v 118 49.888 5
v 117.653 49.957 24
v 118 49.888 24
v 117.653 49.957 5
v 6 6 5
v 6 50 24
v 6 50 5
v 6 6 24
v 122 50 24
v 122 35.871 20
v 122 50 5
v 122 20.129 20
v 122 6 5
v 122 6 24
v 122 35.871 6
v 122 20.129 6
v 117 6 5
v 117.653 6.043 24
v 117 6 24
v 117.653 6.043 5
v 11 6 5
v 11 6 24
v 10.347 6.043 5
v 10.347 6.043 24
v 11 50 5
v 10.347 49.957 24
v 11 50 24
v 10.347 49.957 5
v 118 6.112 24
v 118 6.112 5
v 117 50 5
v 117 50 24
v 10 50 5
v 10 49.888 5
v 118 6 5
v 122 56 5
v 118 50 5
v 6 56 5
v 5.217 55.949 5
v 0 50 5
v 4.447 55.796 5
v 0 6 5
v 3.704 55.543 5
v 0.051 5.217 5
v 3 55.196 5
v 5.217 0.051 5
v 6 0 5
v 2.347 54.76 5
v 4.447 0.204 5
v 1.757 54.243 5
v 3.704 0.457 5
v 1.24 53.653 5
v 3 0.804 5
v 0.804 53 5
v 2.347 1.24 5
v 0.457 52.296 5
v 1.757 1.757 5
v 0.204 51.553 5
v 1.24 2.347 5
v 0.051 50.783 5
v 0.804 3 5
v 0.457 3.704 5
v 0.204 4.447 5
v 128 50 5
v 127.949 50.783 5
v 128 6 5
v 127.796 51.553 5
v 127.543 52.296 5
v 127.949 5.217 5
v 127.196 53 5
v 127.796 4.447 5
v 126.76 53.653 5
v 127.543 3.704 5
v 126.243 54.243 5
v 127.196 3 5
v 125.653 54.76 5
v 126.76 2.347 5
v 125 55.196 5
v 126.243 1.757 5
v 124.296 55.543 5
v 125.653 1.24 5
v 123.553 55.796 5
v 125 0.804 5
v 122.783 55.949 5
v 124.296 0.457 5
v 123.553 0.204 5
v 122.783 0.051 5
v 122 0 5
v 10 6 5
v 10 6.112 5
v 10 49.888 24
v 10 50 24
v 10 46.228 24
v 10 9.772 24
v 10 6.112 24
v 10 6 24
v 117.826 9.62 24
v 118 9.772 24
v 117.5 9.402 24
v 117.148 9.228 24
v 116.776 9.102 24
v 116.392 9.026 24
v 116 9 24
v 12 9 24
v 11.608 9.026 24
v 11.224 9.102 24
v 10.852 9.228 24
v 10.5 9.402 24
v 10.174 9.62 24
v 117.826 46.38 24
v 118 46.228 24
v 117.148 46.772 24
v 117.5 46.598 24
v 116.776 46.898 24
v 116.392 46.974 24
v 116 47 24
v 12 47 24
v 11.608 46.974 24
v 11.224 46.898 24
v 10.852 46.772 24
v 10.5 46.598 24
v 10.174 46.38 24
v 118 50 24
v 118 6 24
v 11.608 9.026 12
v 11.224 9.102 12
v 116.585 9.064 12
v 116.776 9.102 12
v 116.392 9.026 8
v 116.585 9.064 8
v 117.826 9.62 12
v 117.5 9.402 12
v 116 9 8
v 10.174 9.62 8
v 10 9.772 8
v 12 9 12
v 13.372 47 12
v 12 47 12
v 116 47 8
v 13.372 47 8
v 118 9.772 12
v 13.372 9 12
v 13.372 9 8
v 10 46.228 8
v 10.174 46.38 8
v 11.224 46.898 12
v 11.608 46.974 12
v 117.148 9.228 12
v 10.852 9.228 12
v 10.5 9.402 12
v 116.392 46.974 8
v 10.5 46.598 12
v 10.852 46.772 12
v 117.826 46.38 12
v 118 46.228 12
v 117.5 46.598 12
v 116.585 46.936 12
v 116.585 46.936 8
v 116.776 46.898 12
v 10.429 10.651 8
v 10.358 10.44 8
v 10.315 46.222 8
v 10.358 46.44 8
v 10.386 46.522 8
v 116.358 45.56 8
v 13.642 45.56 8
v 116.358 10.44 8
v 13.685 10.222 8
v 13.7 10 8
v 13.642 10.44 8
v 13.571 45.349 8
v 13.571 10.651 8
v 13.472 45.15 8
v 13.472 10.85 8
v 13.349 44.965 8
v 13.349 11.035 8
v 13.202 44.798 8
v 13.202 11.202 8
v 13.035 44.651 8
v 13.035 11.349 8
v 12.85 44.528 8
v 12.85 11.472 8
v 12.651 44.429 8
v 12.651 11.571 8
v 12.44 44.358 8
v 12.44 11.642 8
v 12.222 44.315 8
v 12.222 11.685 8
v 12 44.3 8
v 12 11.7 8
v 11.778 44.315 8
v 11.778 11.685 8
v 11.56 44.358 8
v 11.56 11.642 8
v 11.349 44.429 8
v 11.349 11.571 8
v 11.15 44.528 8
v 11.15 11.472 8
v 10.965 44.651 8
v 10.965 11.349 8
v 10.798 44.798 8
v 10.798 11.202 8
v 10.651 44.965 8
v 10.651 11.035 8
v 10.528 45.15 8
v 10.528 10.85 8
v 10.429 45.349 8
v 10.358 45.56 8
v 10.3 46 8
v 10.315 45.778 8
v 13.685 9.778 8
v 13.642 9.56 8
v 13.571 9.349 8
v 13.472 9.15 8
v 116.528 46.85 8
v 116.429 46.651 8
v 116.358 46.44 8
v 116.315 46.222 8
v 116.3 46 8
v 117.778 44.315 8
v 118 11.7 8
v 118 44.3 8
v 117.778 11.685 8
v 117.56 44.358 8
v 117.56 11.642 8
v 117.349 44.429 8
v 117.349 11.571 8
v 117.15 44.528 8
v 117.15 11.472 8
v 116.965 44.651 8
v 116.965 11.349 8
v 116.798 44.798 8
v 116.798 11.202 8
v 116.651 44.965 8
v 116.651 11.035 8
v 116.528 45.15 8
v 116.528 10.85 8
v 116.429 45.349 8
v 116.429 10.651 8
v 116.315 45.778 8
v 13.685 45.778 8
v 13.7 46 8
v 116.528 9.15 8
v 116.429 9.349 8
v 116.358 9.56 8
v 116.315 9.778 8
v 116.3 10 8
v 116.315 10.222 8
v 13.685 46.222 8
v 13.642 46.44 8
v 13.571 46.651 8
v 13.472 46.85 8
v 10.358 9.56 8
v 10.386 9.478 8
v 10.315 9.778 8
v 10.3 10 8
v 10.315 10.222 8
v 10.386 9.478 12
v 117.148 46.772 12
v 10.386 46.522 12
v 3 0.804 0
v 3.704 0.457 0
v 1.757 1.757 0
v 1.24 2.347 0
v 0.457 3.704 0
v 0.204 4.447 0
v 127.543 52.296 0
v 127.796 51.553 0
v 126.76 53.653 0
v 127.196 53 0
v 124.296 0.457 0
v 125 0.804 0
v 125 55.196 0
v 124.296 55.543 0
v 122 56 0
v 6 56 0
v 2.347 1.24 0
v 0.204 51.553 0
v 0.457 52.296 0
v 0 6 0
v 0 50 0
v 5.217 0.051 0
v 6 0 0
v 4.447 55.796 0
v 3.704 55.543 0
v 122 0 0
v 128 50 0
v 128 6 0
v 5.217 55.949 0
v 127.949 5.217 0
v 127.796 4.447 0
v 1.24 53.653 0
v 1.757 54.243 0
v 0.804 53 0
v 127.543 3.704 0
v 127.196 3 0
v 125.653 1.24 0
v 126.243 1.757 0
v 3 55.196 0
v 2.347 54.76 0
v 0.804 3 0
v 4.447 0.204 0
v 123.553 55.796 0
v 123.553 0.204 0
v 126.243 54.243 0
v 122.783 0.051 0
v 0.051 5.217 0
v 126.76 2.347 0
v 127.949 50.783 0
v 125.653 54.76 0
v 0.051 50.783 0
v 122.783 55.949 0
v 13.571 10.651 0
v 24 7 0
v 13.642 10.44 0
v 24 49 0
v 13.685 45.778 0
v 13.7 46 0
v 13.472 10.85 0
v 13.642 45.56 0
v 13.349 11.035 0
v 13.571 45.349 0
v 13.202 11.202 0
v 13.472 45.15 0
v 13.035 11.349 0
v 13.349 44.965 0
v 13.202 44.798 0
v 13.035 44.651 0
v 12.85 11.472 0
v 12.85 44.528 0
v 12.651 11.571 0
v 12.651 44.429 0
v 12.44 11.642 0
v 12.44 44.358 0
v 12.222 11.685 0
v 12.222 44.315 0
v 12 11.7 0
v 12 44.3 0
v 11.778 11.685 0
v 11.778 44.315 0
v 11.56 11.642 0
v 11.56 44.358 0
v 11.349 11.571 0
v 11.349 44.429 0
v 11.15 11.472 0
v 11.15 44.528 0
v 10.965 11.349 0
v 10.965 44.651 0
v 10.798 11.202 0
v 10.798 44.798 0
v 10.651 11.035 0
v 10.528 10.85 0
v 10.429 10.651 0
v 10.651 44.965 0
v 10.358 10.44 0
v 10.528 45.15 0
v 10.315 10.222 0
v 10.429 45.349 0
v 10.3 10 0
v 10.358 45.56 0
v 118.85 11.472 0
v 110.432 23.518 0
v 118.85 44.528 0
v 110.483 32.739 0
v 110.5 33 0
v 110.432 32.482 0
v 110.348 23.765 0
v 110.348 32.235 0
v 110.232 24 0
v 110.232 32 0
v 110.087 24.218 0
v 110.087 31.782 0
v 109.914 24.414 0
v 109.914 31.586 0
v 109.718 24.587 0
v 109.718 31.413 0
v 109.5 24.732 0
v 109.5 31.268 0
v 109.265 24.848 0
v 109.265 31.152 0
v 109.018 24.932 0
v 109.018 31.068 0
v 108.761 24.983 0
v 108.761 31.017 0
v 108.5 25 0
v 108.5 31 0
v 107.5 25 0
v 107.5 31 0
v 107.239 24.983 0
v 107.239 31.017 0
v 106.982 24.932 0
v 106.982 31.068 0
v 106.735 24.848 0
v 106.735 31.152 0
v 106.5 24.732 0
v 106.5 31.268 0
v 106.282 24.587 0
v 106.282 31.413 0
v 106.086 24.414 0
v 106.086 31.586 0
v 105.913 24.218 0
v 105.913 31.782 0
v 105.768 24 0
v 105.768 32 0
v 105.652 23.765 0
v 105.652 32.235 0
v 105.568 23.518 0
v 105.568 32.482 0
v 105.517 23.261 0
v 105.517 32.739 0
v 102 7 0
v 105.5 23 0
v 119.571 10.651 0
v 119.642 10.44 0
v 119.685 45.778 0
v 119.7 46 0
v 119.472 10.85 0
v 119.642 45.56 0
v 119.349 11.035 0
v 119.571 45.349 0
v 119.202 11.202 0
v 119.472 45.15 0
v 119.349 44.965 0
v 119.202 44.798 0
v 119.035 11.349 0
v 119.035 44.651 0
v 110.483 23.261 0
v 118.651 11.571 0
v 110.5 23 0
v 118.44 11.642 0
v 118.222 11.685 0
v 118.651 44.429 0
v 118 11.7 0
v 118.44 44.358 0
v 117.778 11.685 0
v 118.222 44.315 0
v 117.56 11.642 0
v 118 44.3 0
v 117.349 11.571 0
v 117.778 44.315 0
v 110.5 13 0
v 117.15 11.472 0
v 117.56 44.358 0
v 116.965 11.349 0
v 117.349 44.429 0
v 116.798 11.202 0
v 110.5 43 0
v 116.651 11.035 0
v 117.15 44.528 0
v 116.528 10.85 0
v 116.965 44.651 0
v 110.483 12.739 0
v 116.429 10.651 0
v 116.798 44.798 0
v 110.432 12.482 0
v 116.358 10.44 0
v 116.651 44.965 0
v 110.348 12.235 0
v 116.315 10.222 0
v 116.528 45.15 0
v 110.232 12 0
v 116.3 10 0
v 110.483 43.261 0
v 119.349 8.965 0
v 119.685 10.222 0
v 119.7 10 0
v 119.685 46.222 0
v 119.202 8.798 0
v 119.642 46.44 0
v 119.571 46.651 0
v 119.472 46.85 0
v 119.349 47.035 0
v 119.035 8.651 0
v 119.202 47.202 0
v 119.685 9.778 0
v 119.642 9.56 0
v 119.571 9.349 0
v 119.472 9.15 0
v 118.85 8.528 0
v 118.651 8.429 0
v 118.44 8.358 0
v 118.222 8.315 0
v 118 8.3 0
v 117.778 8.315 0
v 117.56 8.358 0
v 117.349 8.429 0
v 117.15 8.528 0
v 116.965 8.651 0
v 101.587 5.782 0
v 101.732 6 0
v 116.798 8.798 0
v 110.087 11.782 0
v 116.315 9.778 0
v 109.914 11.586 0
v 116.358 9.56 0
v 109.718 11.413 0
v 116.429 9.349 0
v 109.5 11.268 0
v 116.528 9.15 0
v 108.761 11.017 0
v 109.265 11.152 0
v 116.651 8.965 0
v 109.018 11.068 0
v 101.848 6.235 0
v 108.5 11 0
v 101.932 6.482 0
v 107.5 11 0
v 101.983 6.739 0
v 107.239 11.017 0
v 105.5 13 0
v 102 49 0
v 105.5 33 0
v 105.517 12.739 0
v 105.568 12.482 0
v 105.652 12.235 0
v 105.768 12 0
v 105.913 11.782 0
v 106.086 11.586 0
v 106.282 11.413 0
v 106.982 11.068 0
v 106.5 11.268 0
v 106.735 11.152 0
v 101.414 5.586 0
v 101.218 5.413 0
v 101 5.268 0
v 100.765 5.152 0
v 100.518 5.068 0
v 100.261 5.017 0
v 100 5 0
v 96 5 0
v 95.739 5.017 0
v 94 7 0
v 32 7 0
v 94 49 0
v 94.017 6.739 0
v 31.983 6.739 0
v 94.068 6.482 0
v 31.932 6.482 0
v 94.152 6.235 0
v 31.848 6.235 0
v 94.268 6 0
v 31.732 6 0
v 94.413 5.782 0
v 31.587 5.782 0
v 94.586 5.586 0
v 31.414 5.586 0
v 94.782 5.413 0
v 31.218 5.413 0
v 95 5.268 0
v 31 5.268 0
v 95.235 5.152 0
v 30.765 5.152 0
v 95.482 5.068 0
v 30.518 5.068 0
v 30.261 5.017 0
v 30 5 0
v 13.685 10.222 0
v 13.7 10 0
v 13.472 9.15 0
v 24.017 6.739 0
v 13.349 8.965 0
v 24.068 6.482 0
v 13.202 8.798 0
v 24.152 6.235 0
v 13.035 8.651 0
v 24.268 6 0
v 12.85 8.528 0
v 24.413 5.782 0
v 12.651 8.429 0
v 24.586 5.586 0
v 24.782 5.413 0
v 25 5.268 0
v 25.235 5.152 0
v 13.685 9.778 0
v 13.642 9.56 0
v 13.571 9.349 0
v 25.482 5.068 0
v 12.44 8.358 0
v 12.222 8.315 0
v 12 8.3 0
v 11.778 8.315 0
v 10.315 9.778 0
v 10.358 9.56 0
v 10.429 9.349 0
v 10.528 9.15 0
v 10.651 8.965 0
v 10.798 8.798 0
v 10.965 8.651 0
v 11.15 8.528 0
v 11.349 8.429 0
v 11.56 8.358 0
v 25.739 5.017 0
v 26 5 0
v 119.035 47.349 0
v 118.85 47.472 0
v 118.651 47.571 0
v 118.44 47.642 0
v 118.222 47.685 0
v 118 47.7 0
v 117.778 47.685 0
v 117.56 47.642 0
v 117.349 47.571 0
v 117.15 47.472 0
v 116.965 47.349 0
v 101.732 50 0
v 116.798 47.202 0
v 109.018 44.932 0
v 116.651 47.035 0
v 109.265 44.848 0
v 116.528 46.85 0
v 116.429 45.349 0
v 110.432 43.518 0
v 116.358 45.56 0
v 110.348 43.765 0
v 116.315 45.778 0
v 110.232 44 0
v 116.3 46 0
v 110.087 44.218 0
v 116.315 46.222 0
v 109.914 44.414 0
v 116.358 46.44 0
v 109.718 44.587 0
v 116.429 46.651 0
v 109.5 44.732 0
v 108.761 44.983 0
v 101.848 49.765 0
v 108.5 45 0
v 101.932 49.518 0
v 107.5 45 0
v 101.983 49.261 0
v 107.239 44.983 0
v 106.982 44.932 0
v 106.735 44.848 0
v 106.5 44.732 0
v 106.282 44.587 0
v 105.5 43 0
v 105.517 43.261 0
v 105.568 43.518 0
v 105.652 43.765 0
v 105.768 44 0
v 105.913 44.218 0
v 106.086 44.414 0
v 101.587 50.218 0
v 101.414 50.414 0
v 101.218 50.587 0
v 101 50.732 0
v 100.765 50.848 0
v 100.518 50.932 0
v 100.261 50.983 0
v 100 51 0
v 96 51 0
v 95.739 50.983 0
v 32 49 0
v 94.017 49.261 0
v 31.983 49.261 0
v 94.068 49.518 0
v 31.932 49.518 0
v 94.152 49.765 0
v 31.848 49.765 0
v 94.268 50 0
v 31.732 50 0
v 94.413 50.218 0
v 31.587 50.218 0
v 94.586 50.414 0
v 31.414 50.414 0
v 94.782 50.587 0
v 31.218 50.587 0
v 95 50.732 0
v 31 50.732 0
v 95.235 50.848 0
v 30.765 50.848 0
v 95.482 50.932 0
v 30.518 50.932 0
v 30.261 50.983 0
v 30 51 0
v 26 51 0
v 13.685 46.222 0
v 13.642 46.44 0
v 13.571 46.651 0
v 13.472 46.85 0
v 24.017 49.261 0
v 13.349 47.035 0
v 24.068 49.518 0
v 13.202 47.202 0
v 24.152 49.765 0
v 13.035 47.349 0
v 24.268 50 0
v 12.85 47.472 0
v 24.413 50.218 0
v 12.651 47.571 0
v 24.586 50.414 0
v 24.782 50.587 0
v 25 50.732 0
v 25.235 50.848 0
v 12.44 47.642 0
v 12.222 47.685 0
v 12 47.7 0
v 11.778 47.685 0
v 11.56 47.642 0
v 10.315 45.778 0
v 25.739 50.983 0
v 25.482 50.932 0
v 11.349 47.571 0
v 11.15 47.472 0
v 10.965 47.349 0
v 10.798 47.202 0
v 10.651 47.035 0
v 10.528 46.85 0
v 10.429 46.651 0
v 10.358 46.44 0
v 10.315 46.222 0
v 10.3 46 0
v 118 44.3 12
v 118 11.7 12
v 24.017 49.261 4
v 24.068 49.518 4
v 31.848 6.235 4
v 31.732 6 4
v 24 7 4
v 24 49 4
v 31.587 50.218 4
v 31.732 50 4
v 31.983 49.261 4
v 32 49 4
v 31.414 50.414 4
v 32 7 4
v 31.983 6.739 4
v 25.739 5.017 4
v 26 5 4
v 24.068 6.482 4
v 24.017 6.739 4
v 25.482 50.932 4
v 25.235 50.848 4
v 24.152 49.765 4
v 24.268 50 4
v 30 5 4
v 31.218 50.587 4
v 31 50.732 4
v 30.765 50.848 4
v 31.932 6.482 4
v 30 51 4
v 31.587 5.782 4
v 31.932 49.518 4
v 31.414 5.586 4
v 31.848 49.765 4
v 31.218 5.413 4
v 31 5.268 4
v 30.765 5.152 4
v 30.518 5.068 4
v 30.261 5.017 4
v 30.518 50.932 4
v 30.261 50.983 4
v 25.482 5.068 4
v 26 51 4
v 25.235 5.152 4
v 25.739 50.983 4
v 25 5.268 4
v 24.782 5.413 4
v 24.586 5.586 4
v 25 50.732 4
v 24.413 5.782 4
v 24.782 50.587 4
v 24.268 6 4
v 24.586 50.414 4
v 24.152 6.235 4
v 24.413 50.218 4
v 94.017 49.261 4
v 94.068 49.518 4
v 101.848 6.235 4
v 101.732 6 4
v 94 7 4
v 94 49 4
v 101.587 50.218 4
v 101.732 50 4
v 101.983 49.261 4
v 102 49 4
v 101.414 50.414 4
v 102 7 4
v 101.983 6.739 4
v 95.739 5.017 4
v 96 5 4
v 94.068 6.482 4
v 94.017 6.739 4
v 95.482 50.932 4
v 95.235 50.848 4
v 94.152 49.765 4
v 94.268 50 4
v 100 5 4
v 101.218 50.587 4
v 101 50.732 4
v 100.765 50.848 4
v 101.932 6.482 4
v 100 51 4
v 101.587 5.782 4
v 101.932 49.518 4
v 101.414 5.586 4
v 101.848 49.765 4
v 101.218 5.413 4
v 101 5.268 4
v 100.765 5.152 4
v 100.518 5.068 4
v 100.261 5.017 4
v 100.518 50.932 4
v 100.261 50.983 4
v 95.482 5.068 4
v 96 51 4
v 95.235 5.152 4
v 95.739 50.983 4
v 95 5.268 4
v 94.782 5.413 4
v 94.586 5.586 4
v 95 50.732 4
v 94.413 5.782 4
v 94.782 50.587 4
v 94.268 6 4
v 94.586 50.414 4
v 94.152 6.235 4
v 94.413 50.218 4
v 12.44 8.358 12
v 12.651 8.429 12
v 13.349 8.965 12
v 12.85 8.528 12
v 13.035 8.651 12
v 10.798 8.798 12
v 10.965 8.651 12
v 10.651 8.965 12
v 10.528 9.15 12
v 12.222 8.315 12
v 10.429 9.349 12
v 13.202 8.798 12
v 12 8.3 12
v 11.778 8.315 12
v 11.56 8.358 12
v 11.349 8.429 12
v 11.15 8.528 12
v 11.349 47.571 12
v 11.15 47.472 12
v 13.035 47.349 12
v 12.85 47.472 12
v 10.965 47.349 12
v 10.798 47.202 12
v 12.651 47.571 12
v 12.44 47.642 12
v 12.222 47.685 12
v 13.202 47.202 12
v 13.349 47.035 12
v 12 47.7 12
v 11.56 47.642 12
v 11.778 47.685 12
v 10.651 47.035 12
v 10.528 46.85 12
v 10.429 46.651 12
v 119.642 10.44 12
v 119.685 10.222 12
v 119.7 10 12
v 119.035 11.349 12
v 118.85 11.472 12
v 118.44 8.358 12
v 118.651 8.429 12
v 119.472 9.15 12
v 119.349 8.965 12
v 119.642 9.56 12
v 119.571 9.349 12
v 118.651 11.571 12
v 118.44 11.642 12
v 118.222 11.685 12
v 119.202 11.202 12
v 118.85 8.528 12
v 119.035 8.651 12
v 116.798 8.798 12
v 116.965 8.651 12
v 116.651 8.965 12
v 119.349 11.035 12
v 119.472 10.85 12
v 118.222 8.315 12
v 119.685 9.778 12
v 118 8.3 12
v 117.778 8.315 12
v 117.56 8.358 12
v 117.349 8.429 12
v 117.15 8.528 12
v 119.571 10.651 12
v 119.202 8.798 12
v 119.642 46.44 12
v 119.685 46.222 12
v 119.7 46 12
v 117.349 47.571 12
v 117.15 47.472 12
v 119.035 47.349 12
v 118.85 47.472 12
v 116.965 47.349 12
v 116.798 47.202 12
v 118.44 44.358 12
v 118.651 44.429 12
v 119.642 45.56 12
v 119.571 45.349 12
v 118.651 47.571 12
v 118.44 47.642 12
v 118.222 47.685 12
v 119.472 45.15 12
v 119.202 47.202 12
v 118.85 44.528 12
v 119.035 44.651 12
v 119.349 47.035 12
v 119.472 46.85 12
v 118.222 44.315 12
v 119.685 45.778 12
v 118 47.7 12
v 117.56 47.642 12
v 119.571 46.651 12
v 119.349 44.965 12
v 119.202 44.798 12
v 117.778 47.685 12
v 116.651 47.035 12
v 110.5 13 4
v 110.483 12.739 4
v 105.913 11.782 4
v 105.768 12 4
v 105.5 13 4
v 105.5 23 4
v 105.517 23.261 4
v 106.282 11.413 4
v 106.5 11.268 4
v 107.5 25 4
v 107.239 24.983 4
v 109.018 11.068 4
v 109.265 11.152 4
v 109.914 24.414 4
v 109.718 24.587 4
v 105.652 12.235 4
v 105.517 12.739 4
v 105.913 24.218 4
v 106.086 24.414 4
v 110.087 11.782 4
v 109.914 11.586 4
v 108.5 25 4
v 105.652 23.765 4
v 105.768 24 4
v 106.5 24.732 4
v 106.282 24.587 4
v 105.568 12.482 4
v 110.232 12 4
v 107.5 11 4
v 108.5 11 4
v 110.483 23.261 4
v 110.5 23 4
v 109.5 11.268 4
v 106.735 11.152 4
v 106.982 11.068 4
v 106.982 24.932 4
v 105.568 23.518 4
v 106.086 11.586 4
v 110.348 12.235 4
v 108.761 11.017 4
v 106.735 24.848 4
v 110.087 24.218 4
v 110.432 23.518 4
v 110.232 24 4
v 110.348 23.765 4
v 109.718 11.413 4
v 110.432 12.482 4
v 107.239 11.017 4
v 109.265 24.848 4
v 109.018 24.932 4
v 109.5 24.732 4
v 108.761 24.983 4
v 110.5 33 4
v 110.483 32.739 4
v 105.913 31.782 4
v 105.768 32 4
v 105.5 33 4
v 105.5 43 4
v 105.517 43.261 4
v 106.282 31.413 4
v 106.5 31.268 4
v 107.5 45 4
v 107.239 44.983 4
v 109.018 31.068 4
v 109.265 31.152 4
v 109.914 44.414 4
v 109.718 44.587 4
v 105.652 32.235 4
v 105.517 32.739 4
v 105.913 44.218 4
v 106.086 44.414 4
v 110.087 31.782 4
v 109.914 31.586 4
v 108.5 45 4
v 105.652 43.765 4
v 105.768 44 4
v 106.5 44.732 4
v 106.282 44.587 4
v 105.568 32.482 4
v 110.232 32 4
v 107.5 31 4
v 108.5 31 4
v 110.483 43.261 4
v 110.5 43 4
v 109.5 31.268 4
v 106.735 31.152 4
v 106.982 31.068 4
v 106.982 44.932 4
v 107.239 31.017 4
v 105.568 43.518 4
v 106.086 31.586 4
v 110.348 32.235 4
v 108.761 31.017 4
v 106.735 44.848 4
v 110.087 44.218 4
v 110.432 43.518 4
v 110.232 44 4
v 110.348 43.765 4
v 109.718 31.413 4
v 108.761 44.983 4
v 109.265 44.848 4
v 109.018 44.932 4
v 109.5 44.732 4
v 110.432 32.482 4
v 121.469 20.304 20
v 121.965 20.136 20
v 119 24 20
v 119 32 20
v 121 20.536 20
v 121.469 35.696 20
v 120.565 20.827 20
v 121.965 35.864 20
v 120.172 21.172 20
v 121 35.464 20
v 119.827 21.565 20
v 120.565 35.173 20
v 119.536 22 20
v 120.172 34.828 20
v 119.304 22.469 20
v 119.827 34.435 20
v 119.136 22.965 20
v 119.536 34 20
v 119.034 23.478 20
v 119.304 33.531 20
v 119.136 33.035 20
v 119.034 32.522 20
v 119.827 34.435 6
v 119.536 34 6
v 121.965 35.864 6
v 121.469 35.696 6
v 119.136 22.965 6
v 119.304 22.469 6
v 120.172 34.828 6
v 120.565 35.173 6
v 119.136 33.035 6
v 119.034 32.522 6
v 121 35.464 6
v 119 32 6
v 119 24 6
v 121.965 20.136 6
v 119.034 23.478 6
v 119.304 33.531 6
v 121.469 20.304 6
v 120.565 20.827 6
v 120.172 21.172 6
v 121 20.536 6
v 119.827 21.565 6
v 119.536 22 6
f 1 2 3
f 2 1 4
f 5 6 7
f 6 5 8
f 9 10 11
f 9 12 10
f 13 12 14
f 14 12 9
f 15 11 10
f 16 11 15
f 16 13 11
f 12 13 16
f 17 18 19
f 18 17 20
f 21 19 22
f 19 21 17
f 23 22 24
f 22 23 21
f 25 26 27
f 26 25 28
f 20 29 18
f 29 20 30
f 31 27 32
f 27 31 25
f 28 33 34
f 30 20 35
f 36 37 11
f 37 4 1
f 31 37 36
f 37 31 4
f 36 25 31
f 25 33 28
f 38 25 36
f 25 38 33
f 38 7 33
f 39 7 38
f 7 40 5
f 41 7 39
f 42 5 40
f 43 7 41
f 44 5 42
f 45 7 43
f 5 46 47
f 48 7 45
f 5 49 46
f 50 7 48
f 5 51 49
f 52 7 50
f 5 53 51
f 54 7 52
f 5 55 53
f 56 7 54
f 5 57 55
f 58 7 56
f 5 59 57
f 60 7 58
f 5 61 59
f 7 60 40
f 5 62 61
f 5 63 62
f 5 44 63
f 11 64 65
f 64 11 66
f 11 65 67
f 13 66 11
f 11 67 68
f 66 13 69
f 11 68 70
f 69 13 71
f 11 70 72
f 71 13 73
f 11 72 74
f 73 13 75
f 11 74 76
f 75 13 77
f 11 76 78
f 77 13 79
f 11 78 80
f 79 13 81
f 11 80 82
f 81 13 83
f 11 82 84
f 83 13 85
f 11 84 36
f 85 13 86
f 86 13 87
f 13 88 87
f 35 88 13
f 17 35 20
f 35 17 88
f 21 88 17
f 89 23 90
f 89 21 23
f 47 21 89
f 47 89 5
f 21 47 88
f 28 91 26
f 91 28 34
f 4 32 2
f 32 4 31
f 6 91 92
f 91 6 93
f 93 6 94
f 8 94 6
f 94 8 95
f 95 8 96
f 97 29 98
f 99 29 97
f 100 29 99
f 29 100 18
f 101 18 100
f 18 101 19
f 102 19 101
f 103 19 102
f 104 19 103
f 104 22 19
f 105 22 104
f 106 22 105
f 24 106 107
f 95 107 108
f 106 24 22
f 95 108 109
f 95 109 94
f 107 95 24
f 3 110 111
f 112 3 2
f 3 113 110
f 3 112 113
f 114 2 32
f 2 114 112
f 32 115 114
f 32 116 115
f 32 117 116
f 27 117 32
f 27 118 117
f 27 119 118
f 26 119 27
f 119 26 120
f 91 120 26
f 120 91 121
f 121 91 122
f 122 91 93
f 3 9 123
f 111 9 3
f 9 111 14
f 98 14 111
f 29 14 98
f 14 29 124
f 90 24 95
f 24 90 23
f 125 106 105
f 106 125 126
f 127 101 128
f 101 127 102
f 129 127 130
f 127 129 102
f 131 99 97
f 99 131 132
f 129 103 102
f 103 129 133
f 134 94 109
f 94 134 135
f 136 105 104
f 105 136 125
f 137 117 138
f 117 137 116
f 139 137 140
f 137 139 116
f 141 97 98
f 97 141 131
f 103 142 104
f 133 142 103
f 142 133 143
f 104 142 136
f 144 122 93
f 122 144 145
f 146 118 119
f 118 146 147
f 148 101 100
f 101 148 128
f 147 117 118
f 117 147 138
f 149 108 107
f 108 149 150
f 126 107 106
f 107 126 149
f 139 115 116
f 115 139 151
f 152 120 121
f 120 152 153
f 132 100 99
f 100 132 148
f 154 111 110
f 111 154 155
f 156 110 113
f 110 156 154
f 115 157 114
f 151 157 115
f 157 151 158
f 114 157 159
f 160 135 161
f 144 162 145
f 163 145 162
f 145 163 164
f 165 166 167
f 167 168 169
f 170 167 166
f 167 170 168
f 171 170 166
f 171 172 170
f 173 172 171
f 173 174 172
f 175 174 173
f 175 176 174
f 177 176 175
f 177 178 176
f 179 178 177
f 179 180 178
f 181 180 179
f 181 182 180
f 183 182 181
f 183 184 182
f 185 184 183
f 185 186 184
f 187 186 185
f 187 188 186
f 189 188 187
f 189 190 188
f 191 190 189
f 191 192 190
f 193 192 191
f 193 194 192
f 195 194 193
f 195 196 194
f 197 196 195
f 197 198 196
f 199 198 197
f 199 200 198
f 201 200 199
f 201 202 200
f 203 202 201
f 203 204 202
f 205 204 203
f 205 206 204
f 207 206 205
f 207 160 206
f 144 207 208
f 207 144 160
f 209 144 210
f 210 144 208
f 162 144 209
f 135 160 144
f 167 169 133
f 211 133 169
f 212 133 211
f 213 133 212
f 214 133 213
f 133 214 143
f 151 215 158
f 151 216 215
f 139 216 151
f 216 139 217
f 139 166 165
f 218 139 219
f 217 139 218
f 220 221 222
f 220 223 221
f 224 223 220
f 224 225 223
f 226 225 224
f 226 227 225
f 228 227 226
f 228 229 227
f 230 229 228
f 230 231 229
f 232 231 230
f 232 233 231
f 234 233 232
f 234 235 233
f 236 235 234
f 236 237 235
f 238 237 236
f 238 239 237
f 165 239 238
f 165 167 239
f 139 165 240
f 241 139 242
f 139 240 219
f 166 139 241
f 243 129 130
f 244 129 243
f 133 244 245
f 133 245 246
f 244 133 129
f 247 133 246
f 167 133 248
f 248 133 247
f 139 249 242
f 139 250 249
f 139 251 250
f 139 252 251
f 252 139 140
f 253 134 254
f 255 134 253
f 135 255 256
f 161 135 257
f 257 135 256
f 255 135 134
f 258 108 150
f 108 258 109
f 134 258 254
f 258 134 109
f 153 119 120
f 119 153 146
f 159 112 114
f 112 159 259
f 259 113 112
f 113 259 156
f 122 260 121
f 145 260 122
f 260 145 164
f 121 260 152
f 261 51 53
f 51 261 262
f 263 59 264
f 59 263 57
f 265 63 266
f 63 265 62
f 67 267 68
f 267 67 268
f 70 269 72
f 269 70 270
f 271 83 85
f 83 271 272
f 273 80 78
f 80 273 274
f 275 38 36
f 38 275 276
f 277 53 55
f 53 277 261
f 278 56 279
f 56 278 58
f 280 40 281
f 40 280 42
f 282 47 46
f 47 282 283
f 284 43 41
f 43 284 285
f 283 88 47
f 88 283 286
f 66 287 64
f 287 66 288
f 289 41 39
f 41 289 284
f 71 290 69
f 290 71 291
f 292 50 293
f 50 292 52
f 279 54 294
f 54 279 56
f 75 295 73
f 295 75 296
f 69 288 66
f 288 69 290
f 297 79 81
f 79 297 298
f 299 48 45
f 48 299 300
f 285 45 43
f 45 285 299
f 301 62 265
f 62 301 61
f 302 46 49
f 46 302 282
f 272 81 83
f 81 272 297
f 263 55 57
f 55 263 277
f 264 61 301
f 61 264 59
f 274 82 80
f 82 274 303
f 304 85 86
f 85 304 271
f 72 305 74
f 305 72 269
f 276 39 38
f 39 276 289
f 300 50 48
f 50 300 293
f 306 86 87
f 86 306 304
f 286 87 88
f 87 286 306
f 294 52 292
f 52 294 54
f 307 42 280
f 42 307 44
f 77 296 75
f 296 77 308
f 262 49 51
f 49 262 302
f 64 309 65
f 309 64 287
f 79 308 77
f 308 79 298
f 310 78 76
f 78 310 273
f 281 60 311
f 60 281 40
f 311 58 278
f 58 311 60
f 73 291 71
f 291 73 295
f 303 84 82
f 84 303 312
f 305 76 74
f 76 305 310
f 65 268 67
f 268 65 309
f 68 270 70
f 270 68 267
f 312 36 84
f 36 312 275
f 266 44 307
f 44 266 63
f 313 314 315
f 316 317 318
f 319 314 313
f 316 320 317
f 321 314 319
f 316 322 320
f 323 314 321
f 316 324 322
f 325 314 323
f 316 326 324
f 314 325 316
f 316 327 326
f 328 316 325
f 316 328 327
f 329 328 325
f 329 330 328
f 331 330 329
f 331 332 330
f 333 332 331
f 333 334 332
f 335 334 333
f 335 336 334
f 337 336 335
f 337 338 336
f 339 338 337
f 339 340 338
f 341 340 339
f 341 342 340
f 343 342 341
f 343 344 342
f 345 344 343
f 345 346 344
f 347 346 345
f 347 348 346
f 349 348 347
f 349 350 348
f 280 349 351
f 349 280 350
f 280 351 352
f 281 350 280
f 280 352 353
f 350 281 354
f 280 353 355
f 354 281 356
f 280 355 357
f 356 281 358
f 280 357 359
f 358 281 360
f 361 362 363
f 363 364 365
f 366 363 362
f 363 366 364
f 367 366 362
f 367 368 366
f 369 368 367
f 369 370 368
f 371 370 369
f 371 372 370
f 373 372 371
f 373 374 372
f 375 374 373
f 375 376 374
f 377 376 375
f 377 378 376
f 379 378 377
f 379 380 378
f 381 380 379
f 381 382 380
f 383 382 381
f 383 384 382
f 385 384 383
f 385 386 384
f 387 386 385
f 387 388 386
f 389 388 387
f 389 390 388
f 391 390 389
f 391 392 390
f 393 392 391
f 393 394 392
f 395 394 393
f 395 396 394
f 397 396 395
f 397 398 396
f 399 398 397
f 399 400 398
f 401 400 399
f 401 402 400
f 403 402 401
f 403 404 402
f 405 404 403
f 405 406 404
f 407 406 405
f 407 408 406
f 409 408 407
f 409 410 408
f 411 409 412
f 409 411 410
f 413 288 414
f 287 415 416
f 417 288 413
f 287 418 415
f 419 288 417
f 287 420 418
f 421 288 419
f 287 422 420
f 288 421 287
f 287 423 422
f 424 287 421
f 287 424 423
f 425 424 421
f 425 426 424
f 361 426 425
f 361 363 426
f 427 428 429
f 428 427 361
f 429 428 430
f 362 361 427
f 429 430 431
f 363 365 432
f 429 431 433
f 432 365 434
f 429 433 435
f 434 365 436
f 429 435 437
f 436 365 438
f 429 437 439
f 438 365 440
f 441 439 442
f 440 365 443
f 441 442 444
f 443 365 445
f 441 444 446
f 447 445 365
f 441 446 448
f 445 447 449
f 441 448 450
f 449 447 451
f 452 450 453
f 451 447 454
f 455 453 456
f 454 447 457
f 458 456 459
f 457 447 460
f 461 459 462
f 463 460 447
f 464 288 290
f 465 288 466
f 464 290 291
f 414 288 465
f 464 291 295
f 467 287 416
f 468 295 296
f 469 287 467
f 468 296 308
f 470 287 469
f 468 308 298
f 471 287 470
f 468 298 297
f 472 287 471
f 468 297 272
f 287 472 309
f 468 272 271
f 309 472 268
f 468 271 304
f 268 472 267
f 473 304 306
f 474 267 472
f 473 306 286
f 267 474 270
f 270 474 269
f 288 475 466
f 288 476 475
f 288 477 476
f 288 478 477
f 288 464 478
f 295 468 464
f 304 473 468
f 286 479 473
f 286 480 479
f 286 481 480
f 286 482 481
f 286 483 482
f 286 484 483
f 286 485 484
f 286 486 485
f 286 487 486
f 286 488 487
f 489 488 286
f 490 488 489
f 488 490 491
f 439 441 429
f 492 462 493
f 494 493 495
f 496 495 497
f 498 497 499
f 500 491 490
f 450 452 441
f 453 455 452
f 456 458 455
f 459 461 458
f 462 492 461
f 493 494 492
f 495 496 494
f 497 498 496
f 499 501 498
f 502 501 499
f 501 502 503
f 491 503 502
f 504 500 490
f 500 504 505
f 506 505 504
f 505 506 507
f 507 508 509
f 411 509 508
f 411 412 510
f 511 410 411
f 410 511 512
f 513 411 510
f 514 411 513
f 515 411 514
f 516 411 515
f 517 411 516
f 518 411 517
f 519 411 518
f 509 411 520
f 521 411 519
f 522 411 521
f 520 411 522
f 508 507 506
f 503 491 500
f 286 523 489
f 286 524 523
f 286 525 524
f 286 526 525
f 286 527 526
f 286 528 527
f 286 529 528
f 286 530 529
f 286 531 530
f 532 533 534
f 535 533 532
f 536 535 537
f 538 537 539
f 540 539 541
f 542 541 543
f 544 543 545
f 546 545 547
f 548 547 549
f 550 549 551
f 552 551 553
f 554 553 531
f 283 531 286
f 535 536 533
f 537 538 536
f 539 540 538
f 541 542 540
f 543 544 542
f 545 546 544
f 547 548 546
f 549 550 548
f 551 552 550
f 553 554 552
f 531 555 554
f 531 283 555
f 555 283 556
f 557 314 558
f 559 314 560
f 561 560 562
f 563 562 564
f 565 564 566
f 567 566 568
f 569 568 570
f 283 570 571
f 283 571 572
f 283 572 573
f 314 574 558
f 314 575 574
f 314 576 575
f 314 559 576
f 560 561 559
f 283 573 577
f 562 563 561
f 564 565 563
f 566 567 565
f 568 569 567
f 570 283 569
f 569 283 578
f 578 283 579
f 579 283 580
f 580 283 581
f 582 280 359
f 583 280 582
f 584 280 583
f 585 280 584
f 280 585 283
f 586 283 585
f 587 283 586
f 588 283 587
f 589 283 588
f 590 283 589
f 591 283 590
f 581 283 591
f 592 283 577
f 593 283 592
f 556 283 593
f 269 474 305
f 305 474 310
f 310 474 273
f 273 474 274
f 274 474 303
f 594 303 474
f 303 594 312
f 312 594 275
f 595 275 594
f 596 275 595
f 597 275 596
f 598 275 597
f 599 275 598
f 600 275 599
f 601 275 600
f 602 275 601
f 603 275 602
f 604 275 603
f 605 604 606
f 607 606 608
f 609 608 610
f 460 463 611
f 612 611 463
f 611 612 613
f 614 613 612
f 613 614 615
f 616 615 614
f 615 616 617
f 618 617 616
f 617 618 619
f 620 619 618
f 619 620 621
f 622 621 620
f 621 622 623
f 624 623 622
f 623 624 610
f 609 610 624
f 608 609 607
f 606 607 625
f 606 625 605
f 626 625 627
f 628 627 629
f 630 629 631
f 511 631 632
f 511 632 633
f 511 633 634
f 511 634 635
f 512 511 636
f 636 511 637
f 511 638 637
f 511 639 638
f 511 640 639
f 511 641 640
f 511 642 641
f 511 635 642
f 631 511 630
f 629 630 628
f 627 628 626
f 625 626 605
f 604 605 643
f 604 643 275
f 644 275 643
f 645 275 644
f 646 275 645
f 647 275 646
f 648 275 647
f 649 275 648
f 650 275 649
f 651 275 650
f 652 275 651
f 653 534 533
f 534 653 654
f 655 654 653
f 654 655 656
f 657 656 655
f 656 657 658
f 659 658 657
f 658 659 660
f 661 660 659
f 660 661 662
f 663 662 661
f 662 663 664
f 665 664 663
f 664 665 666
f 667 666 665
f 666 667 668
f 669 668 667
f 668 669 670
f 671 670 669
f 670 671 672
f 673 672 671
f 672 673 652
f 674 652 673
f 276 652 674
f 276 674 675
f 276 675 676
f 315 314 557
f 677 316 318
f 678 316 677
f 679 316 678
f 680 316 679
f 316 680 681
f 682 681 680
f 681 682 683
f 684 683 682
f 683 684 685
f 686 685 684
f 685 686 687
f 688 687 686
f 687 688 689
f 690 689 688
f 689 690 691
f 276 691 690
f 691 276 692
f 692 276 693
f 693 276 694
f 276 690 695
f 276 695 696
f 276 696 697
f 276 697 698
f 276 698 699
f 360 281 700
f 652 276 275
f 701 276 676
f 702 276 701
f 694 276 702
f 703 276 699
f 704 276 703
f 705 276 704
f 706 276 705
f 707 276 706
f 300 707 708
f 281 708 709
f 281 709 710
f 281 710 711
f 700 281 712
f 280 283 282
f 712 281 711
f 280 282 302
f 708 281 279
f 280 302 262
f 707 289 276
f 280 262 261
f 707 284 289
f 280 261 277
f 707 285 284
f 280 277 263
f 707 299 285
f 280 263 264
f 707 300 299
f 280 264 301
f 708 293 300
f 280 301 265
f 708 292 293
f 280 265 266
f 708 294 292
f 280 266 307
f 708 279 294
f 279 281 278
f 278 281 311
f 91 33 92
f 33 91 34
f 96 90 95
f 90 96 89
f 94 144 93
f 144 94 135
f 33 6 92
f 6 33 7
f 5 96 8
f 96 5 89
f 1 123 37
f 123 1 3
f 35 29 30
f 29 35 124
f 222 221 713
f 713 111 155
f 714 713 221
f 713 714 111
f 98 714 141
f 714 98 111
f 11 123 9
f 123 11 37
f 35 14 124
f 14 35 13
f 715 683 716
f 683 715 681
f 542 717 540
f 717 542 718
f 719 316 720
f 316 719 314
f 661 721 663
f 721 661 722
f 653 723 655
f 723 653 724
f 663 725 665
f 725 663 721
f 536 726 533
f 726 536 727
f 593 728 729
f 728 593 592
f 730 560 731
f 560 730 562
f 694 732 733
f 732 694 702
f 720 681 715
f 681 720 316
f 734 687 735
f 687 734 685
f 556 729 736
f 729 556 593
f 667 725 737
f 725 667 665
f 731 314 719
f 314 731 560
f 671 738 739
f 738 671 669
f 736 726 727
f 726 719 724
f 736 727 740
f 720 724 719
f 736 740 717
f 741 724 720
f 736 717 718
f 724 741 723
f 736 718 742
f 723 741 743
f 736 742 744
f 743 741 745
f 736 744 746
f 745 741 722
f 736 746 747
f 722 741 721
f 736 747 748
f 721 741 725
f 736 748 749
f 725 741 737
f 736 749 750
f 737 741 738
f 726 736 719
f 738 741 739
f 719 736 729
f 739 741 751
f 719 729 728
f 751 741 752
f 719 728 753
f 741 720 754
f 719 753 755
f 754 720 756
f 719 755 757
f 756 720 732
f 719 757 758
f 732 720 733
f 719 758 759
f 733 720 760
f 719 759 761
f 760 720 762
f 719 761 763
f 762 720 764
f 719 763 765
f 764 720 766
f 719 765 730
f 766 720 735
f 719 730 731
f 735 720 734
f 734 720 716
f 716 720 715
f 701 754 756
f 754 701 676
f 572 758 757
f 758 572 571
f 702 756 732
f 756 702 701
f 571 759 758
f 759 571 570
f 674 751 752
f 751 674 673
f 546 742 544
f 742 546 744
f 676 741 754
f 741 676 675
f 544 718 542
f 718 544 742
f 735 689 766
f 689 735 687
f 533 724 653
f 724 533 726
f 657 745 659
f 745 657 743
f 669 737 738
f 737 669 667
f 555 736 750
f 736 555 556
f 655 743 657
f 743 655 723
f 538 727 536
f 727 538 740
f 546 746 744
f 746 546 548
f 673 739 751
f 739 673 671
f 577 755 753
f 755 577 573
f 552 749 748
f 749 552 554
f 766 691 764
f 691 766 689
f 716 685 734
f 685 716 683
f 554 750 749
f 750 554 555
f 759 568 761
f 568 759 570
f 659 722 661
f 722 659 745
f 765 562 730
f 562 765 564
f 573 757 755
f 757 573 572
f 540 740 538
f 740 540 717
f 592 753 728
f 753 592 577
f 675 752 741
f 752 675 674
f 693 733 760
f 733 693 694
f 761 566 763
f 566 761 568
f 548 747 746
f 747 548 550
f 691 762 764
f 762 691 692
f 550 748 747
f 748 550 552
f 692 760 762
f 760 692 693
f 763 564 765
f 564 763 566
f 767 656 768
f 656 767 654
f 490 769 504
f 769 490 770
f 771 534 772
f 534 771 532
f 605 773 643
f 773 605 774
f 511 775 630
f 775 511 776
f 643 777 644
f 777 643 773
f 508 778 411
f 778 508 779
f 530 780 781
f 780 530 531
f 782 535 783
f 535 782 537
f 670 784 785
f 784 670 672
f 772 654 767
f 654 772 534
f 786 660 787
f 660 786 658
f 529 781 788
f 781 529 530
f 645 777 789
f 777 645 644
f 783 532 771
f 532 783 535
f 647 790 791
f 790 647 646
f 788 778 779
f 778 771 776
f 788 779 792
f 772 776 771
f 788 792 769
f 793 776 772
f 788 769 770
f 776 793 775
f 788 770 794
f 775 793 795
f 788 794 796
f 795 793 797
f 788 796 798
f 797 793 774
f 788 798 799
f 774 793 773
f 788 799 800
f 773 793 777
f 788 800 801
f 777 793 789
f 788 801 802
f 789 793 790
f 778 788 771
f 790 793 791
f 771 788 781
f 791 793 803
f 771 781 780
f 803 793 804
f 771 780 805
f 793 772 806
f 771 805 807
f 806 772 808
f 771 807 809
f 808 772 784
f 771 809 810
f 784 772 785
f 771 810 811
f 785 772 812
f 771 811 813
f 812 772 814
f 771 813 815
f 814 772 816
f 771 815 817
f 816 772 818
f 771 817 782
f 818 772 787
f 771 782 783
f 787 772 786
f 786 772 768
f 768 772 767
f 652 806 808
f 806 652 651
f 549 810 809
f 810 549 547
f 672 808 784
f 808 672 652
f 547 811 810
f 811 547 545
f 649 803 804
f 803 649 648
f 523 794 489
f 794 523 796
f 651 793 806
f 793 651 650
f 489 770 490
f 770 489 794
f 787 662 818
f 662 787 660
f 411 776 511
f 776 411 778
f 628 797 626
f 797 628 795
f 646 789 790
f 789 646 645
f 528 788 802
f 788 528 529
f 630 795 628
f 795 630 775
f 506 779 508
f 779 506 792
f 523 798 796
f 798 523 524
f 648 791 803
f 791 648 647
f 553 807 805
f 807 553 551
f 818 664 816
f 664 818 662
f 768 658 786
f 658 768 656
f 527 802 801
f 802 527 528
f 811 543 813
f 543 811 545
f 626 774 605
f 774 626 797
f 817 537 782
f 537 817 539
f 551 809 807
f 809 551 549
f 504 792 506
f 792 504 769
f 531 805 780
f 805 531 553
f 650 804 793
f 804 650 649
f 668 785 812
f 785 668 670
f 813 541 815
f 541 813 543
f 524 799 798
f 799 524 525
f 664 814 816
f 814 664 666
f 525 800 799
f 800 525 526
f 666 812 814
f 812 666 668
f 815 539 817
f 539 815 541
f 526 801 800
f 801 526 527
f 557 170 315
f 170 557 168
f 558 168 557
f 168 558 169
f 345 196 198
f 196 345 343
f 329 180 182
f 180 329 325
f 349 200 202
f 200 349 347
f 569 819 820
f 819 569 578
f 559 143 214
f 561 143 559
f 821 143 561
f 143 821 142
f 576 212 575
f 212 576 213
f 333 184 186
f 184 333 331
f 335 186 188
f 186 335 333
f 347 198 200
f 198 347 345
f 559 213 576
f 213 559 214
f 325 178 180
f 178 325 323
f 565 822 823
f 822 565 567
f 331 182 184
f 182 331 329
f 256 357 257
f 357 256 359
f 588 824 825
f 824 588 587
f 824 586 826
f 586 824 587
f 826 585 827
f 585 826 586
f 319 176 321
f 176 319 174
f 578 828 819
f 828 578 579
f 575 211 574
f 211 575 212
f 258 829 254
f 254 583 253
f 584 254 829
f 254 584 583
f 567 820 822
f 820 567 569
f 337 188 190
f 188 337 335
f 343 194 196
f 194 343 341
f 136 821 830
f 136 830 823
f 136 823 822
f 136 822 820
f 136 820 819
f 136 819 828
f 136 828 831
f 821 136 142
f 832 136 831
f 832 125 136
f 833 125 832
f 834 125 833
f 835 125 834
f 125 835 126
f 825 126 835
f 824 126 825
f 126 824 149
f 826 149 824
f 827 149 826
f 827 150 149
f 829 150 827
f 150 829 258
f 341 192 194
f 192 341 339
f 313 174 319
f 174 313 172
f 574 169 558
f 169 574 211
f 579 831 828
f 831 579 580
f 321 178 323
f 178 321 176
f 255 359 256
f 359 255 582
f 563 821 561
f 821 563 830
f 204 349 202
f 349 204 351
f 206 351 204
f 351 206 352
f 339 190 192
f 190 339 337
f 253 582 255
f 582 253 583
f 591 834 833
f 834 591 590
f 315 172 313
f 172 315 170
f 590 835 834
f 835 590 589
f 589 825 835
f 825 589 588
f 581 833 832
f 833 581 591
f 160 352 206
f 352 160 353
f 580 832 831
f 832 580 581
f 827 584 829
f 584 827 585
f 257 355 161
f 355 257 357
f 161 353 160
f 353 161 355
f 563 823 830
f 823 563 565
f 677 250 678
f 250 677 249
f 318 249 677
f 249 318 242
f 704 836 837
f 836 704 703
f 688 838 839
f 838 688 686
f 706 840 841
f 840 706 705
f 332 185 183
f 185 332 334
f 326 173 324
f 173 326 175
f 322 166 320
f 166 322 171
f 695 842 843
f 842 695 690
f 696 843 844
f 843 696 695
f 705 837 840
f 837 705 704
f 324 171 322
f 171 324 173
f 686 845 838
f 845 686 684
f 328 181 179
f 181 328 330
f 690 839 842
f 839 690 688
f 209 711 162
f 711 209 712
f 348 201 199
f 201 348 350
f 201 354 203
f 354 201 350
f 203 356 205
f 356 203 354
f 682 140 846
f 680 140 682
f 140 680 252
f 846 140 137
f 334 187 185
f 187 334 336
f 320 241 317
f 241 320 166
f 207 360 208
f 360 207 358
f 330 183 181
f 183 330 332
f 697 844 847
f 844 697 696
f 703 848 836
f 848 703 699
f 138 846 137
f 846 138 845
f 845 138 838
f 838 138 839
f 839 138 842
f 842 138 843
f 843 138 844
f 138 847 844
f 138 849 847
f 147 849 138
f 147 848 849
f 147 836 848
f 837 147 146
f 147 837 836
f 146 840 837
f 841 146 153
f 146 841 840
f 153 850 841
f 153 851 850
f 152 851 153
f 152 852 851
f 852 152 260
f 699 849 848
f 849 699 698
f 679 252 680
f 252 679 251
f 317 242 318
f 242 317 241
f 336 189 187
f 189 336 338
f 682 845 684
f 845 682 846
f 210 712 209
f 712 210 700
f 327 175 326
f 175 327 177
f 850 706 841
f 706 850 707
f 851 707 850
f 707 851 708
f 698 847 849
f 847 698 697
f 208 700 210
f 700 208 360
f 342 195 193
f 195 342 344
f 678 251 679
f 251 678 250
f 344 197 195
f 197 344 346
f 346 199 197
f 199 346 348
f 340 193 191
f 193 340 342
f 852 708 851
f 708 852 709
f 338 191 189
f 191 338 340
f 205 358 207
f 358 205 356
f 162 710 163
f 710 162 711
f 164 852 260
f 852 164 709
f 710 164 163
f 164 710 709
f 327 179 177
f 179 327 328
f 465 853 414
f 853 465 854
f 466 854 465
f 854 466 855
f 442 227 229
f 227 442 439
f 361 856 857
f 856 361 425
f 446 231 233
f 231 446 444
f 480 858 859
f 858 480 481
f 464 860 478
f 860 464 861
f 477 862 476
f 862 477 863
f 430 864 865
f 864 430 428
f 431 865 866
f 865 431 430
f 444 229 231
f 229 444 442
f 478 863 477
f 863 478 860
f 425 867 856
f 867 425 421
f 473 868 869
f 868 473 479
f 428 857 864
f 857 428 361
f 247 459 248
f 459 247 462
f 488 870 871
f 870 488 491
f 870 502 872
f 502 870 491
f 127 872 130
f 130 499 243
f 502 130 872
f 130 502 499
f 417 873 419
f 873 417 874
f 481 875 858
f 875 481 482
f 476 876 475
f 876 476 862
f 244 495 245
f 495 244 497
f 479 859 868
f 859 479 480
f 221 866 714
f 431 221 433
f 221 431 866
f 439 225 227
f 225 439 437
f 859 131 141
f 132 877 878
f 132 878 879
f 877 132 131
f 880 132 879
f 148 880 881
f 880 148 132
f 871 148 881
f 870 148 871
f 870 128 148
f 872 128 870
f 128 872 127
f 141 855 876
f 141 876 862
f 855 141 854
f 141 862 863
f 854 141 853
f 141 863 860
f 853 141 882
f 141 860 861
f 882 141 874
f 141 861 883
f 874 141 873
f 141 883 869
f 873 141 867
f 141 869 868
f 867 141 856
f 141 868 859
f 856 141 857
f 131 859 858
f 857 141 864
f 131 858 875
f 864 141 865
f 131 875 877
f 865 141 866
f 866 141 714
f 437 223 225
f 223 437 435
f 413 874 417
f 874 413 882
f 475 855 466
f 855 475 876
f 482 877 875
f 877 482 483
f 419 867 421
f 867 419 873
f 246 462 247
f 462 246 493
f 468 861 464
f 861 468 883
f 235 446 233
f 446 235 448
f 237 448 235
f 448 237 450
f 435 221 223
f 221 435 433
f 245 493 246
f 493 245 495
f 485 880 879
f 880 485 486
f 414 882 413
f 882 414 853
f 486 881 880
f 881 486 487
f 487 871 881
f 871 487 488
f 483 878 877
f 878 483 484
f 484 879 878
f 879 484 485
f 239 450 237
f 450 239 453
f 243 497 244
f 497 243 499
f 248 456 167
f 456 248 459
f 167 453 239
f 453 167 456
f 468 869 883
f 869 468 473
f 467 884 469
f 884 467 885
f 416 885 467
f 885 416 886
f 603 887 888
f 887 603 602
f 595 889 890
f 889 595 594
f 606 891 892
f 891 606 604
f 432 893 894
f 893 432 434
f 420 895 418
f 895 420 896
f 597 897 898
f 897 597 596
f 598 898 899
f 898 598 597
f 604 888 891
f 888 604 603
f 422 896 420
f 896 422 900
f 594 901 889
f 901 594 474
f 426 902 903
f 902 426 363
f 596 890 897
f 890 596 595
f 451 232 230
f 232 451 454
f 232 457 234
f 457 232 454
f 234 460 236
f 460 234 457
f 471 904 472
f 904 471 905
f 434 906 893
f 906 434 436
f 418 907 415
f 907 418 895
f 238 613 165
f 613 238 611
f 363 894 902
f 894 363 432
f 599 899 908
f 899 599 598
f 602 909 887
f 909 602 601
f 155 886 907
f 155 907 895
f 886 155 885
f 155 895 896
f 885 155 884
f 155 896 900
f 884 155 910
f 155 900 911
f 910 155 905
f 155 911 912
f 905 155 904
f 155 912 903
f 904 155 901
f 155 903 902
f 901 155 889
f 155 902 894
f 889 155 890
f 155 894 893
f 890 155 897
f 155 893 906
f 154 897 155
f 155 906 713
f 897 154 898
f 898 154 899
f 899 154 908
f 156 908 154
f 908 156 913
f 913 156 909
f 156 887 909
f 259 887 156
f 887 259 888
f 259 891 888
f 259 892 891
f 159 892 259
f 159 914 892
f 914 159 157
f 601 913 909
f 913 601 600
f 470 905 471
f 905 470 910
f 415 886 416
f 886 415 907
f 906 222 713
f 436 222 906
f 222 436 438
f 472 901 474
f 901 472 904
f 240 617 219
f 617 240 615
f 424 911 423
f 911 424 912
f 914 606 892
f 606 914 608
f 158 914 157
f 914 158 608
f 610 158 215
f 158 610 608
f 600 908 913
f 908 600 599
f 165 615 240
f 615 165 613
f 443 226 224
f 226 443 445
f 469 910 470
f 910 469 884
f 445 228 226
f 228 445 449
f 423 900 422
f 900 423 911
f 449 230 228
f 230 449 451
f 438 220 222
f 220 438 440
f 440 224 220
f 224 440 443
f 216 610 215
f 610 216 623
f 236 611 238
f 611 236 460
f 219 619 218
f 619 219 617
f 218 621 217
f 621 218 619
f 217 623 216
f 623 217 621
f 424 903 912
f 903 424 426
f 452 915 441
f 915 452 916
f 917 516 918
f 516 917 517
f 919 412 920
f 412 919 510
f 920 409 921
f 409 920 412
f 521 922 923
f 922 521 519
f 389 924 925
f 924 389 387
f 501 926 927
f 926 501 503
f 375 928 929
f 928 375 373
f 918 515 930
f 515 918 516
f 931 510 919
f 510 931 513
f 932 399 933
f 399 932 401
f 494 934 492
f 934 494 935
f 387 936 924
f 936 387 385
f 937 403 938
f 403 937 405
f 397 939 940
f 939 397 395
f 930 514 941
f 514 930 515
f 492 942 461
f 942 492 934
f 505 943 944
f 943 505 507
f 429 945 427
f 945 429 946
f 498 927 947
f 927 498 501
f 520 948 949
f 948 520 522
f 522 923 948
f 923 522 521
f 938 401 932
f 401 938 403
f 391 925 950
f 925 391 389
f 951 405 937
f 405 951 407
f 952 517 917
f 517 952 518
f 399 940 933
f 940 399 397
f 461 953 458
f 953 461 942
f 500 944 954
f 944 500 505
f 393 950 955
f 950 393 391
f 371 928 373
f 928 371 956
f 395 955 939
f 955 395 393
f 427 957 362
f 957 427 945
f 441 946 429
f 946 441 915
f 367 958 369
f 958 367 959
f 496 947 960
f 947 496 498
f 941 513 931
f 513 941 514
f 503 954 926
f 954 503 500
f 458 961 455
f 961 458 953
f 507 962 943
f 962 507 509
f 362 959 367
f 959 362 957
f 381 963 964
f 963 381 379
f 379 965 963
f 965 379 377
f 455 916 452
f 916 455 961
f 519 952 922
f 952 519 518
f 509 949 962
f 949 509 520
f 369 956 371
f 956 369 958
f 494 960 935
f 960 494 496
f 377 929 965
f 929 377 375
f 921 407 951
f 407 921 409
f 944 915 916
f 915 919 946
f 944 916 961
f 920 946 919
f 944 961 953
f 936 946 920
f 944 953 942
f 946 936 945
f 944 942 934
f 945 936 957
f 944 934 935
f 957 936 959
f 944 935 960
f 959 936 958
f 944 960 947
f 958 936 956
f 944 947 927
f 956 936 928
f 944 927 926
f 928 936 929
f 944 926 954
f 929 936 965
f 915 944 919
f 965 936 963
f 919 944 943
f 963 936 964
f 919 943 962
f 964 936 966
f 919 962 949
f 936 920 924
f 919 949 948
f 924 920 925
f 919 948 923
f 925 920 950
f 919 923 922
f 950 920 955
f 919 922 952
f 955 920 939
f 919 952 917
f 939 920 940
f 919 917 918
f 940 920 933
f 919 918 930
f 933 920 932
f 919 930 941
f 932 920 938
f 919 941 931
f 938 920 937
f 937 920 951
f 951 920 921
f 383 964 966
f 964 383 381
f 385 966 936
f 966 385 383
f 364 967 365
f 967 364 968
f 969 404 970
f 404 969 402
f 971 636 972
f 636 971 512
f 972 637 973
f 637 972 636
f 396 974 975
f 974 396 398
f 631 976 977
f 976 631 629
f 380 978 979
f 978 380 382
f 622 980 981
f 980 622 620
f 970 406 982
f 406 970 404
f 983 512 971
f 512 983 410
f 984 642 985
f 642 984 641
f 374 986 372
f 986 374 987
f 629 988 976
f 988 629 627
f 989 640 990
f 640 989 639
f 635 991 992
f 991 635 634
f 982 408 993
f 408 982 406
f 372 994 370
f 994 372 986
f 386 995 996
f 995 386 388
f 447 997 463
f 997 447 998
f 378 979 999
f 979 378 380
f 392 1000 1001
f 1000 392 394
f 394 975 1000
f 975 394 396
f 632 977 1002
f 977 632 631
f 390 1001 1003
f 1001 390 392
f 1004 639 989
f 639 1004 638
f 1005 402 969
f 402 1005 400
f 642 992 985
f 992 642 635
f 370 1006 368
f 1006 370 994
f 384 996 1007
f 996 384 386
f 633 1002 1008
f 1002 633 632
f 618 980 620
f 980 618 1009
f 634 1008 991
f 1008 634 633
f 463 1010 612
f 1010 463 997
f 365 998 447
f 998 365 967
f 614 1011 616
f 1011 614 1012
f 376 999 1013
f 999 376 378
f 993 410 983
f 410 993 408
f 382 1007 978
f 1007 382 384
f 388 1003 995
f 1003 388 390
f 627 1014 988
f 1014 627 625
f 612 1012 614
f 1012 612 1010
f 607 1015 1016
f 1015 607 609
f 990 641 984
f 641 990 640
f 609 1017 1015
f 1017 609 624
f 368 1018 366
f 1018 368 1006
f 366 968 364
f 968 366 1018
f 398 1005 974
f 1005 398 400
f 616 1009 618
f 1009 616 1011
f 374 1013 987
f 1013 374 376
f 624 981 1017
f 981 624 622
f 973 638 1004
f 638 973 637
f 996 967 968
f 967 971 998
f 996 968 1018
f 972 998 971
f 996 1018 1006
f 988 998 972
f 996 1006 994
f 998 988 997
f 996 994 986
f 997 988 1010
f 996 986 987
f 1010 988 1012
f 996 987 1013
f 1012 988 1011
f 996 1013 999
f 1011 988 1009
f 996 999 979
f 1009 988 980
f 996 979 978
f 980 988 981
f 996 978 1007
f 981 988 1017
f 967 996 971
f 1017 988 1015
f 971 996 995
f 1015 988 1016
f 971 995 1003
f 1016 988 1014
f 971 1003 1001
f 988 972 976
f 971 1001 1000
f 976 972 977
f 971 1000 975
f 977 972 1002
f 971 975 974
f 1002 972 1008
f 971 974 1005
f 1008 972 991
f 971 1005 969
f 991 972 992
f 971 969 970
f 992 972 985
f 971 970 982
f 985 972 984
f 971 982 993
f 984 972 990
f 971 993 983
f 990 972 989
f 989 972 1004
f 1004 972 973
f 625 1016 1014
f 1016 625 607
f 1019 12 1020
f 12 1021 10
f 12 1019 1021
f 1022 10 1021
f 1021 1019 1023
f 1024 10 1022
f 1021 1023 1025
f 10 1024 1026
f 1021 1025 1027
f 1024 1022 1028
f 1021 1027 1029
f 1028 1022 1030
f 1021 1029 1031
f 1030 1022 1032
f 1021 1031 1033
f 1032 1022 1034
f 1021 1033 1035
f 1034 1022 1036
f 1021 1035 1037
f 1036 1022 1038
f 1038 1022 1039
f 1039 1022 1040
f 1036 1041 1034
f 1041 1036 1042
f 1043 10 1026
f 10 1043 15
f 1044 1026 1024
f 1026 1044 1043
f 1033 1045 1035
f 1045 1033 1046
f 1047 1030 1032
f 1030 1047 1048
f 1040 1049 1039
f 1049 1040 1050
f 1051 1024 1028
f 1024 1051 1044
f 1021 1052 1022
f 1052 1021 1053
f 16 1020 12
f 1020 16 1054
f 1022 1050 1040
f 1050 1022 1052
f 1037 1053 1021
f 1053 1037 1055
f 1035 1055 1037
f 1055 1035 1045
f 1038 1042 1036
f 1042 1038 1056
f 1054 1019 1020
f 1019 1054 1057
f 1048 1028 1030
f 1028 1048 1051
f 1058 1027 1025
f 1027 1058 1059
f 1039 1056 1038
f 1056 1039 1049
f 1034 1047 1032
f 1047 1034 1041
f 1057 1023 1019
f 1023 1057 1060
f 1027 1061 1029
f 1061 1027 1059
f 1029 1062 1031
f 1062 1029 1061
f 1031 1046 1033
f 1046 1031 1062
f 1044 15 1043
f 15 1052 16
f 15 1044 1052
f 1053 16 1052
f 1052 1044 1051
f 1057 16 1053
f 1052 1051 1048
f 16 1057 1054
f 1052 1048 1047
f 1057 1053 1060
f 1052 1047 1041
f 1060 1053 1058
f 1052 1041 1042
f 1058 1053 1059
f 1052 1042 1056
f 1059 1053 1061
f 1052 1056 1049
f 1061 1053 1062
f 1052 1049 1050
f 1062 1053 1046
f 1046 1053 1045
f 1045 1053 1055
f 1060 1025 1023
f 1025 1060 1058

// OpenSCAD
// file: robot_params.scad
// Shared mechanical parameters for Codex house companion CAD v0.
// Units: millimeters.
$fn = 48;

// Body envelope
base_len = 300;
base_w = 220;
base_floor_th = 4;
wall_th = 3;
corner_r = 12;
base_wall_h = 34;
deck_z = 48;
total_body_h = 112;

// Personality / render colors
codex_teal = "#13C8C3";
codex_blue = "#2F6BFF";
codex_cream = "#F5F0E6";
codex_charcoal = "#242832";
codex_lime = "#B9FF66";
codex_orange = "#FF9F1C";
bumper_tpu = "#2B2F3A";

// Drive
wheel_d = 80;
wheel_w = 24;
axle_z = 42;
axle_x = 145;
wheel_clearance = 5;
motor_mount_slot = 5;
motor_pod_len = 72;
motor_pod_w = 36;
motor_pod_h = 46;

// Fasteners
m3_clearance_d = 3.4;
m3_insert_d = 4.8;
m3_insert_depth = 5.7;
m25_clearance_d = 2.8;
m2_clearance_d = 2.3;

// Electronics
pi_len = 85;
pi_w = 56;
pi_mount_x = 58;
pi_mount_y = 49;
hat_keepout_z = 28;
cooling_keepout_z = 18;
deck_th = 4;
deck_offset_x = 18;
deck_offset_y = 14;
deck_mount_x = [24, base_len-60];
deck_mount_y = [20, base_w-62];
deck_boss_x = [deck_offset_x + deck_mount_x[0], deck_offset_x + deck_mount_x[1]];
deck_boss_y = [deck_offset_y + deck_mount_y[0], deck_offset_y + deck_mount_y[1]];
deck_len = base_len - 36;
deck_w = base_w - 42;

// Battery
battery_len = 110;
battery_w = 38;
battery_h = 38;
battery_padding = 3;
strap_slot_w = 8;
strap_slot_len = 46;
battery_cradle_mount_x = [12, battery_len + 2*battery_padding + 2];
battery_cradle_mount_y = [10, battery_w + 2*battery_padding + 2];

// Storage keepout for later USB 3 module
usb_storage_len = 90;
usb_storage_w = 35;
usb_storage_h = 12;
usb_cable_bend_r = 25;

// Sensors and expression
head_z = 205;
mast_h = 120;
mast_w = 38;
mast_d = 32;
head_w = 96;
head_h = 58;
head_d = 46;
camera_board_w = 25;
camera_board_h = 24;
tof_pod_w = 24;
tof_pod_h = 18;
tof_pod_d = 18;
front_sensor_angle = 20;
bumper_travel = 8;
soft_bumper_h = 22;

// Assembly anchors / safety placeholders
battery_cradle_x = 166;
battery_cradle_y = base_w/2 - (battery_w + 2*battery_padding + 12)/2;
motor_pod_anchor_x = [axle_x-28, axle_x+28];
motor_pod_anchor_y = [base_w/2 - 61, base_w/2 + 61];
motor_pod_local_hole_x = [8, 64];
motor_pod_local_hole_y = motor_pod_w/2;
estop_x = base_len - 62;
estop_y = base_w/2;
estop_mount_d = 22;
estop_guard_d = 48;
estop_plate_w = 70;
estop_plate_d = 62;
estop_plate_th = 5;
estop_plate_mount_x = [10, estop_plate_w - 10];
estop_plate_mount_y = [10, estop_plate_d - 10];

// Split-print helpers for common 220 x 220 mm beds
base_split_x = base_len/2;
deck_split_x = deck_len/2;
seam_screw_offset = 14;
base_seam_y = [42, base_w/2, base_w-42];
deck_seam_y = [36, deck_w/2, deck_w-36];
seam_plate_w = 64;
seam_plate_d = 18;
seam_plate_th = 3;

module rounded_box(size=[10,10,10], r=2, center=false) {
  // Lightweight printable rounded rectangle prism using hull of cylinders.
  translate(center ? [-size[0]/2, -size[1]/2, -size[2]/2] : [0,0,0])
  hull() {
    for (x=[r, size[0]-r]) for (y=[r, size[1]-r])
      translate([x,y,0]) cylinder(h=size[2], r=r);
  }
}

module screw_hole(d=m3_clearance_d, h=20) {
  cylinder(h=h, d=d, center=true);
}

module preview_only() {
  if ($preview) children();
}

module insert_boss(d=10, h=8, hole=m3_insert_d) {
  difference() { cylinder(h=h, d=d); translate([0,0,-1]) cylinder(h=h+2, d=hole); }
}
// main file
include <robot_params.scad>
module battery_cradle() {
  pocket=[battery_len+2*battery_padding,battery_w+2*battery_padding,battery_h/2];
  color(codex_orange)
  difference() {
    union() {
      rounded_box([pocket[0]+12,pocket[1]+12,5],6);
      translate([6,6,5]) difference(){ rounded_box([pocket[0],pocket[1],pocket[2]],5); translate([3,3,3]) rounded_box([pocket[0]-6,pocket[1]-6,pocket[2]+2],3); }
      translate([6,6,5]) cube([4,pocket[1],battery_h/2]);
      translate([pocket[0]+2,6,5]) cube([4,pocket[1],battery_h/2]);
    }
    for (x=[28,pocket[0]-18]) translate([x,(pocket[1]+12)/2,-1]) rounded_box([strap_slot_w,strap_slot_len,10],2,center=true);
    for (x=battery_cradle_mount_x) for (y=battery_cradle_mount_y)
      translate([x,y,2]) screw_hole(h=20);
    translate([pocket[0]+12,(pocket[1]+12)/2,13]) rounded_box([18,16,14],4,center=true); // wire exit
    for (y=[18,pocket[1]-6])
      translate([pocket[0]-8,y,-1]) rounded_box([5,14,10],2,center=true); // cable-tie strain relief
  }
  %translate([6+battery_padding,6+battery_padding,8]) color([0.1,0.1,0.1,0.35]) cube([battery_len,battery_w,battery_h]);
}
battery_cradle();
